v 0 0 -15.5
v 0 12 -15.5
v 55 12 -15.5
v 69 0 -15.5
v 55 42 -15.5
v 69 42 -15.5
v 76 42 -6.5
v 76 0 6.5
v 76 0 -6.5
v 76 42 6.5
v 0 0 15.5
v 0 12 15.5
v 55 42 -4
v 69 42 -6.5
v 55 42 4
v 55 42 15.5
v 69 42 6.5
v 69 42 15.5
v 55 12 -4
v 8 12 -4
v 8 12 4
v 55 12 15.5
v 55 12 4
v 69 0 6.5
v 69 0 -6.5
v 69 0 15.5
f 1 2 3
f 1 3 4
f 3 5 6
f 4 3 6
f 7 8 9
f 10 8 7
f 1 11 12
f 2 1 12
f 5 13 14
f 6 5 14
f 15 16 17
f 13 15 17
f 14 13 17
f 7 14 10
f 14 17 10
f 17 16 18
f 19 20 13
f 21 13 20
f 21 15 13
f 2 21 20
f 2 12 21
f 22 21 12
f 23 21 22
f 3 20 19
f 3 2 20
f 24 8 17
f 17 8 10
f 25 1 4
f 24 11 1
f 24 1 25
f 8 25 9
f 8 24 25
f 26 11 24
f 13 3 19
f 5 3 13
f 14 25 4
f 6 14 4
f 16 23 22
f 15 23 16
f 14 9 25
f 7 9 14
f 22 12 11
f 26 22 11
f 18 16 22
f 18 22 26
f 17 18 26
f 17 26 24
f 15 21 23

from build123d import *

# Parameters (mm, degrees)
SKETCH1_W               = 76
SKETCH1_H               = 42
BOSS_EXTRUDE1_DEPTH     = 15.5
SKETCH2_W               = 9
SKETCH2_H               = 42
CUT_EXTRUDE1_DEPTH      = 7
CUT_EXTRUDE2_DEPTH      = 93.200867675
CUT_EXTRUDE2_DEPTH_BACK = 93.200867675
SKETCH3_W               = 55
SKETCH3_H               = 30
BOSS_EXTRUDE2_DEPTH     = 4


with BuildPart() as part:
    # Sketch1 → Boss-Extrude1 (new, symmetric)
    with BuildSketch(Plane.XY):
        with Locations((38, 21)):
            Rectangle(SKETCH1_W, SKETCH1_H)
    extrude(amount=BOSS_EXTRUDE1_DEPTH, both=True)

    # Sketch2 → Cut-Extrude1 (cut)
    with BuildSketch(Plane(origin=(76, 0, 0), x_dir=(0, 0, -1), z_dir=(1, 0, 0))):
        with Locations((-11, 21)):
            Rectangle(SKETCH2_W, SKETCH2_H)
        with Locations((11, 21)):
            Rectangle(SKETCH2_W, SKETCH2_H)
    extrude(amount=-CUT_EXTRUDE1_DEPTH, mode=Mode.SUBTRACT)

    # Sketch3 → Cut-Extrude2 (cut, two sides: drawn at the far end of the back side and taken through both)
    with BuildSketch(Plane.XY.offset(15.5).offset(-CUT_EXTRUDE2_DEPTH_BACK)):
        with Locations((27.5, 27)):
            Rectangle(SKETCH3_W, SKETCH3_H)
    extrude(amount=CUT_EXTRUDE2_DEPTH + CUT_EXTRUDE2_DEPTH_BACK, mode=Mode.SUBTRACT)

    # Sketch5 → Boss-Extrude2 (add, symmetric)
    with BuildSketch(Plane.XY):
        Polygon((55, 42), (8, 12), (55, 12), (55, 12.687234068), align=None)
    extrude(amount=BOSS_EXTRUDE2_DEPTH, both=True)


solid = part.part
